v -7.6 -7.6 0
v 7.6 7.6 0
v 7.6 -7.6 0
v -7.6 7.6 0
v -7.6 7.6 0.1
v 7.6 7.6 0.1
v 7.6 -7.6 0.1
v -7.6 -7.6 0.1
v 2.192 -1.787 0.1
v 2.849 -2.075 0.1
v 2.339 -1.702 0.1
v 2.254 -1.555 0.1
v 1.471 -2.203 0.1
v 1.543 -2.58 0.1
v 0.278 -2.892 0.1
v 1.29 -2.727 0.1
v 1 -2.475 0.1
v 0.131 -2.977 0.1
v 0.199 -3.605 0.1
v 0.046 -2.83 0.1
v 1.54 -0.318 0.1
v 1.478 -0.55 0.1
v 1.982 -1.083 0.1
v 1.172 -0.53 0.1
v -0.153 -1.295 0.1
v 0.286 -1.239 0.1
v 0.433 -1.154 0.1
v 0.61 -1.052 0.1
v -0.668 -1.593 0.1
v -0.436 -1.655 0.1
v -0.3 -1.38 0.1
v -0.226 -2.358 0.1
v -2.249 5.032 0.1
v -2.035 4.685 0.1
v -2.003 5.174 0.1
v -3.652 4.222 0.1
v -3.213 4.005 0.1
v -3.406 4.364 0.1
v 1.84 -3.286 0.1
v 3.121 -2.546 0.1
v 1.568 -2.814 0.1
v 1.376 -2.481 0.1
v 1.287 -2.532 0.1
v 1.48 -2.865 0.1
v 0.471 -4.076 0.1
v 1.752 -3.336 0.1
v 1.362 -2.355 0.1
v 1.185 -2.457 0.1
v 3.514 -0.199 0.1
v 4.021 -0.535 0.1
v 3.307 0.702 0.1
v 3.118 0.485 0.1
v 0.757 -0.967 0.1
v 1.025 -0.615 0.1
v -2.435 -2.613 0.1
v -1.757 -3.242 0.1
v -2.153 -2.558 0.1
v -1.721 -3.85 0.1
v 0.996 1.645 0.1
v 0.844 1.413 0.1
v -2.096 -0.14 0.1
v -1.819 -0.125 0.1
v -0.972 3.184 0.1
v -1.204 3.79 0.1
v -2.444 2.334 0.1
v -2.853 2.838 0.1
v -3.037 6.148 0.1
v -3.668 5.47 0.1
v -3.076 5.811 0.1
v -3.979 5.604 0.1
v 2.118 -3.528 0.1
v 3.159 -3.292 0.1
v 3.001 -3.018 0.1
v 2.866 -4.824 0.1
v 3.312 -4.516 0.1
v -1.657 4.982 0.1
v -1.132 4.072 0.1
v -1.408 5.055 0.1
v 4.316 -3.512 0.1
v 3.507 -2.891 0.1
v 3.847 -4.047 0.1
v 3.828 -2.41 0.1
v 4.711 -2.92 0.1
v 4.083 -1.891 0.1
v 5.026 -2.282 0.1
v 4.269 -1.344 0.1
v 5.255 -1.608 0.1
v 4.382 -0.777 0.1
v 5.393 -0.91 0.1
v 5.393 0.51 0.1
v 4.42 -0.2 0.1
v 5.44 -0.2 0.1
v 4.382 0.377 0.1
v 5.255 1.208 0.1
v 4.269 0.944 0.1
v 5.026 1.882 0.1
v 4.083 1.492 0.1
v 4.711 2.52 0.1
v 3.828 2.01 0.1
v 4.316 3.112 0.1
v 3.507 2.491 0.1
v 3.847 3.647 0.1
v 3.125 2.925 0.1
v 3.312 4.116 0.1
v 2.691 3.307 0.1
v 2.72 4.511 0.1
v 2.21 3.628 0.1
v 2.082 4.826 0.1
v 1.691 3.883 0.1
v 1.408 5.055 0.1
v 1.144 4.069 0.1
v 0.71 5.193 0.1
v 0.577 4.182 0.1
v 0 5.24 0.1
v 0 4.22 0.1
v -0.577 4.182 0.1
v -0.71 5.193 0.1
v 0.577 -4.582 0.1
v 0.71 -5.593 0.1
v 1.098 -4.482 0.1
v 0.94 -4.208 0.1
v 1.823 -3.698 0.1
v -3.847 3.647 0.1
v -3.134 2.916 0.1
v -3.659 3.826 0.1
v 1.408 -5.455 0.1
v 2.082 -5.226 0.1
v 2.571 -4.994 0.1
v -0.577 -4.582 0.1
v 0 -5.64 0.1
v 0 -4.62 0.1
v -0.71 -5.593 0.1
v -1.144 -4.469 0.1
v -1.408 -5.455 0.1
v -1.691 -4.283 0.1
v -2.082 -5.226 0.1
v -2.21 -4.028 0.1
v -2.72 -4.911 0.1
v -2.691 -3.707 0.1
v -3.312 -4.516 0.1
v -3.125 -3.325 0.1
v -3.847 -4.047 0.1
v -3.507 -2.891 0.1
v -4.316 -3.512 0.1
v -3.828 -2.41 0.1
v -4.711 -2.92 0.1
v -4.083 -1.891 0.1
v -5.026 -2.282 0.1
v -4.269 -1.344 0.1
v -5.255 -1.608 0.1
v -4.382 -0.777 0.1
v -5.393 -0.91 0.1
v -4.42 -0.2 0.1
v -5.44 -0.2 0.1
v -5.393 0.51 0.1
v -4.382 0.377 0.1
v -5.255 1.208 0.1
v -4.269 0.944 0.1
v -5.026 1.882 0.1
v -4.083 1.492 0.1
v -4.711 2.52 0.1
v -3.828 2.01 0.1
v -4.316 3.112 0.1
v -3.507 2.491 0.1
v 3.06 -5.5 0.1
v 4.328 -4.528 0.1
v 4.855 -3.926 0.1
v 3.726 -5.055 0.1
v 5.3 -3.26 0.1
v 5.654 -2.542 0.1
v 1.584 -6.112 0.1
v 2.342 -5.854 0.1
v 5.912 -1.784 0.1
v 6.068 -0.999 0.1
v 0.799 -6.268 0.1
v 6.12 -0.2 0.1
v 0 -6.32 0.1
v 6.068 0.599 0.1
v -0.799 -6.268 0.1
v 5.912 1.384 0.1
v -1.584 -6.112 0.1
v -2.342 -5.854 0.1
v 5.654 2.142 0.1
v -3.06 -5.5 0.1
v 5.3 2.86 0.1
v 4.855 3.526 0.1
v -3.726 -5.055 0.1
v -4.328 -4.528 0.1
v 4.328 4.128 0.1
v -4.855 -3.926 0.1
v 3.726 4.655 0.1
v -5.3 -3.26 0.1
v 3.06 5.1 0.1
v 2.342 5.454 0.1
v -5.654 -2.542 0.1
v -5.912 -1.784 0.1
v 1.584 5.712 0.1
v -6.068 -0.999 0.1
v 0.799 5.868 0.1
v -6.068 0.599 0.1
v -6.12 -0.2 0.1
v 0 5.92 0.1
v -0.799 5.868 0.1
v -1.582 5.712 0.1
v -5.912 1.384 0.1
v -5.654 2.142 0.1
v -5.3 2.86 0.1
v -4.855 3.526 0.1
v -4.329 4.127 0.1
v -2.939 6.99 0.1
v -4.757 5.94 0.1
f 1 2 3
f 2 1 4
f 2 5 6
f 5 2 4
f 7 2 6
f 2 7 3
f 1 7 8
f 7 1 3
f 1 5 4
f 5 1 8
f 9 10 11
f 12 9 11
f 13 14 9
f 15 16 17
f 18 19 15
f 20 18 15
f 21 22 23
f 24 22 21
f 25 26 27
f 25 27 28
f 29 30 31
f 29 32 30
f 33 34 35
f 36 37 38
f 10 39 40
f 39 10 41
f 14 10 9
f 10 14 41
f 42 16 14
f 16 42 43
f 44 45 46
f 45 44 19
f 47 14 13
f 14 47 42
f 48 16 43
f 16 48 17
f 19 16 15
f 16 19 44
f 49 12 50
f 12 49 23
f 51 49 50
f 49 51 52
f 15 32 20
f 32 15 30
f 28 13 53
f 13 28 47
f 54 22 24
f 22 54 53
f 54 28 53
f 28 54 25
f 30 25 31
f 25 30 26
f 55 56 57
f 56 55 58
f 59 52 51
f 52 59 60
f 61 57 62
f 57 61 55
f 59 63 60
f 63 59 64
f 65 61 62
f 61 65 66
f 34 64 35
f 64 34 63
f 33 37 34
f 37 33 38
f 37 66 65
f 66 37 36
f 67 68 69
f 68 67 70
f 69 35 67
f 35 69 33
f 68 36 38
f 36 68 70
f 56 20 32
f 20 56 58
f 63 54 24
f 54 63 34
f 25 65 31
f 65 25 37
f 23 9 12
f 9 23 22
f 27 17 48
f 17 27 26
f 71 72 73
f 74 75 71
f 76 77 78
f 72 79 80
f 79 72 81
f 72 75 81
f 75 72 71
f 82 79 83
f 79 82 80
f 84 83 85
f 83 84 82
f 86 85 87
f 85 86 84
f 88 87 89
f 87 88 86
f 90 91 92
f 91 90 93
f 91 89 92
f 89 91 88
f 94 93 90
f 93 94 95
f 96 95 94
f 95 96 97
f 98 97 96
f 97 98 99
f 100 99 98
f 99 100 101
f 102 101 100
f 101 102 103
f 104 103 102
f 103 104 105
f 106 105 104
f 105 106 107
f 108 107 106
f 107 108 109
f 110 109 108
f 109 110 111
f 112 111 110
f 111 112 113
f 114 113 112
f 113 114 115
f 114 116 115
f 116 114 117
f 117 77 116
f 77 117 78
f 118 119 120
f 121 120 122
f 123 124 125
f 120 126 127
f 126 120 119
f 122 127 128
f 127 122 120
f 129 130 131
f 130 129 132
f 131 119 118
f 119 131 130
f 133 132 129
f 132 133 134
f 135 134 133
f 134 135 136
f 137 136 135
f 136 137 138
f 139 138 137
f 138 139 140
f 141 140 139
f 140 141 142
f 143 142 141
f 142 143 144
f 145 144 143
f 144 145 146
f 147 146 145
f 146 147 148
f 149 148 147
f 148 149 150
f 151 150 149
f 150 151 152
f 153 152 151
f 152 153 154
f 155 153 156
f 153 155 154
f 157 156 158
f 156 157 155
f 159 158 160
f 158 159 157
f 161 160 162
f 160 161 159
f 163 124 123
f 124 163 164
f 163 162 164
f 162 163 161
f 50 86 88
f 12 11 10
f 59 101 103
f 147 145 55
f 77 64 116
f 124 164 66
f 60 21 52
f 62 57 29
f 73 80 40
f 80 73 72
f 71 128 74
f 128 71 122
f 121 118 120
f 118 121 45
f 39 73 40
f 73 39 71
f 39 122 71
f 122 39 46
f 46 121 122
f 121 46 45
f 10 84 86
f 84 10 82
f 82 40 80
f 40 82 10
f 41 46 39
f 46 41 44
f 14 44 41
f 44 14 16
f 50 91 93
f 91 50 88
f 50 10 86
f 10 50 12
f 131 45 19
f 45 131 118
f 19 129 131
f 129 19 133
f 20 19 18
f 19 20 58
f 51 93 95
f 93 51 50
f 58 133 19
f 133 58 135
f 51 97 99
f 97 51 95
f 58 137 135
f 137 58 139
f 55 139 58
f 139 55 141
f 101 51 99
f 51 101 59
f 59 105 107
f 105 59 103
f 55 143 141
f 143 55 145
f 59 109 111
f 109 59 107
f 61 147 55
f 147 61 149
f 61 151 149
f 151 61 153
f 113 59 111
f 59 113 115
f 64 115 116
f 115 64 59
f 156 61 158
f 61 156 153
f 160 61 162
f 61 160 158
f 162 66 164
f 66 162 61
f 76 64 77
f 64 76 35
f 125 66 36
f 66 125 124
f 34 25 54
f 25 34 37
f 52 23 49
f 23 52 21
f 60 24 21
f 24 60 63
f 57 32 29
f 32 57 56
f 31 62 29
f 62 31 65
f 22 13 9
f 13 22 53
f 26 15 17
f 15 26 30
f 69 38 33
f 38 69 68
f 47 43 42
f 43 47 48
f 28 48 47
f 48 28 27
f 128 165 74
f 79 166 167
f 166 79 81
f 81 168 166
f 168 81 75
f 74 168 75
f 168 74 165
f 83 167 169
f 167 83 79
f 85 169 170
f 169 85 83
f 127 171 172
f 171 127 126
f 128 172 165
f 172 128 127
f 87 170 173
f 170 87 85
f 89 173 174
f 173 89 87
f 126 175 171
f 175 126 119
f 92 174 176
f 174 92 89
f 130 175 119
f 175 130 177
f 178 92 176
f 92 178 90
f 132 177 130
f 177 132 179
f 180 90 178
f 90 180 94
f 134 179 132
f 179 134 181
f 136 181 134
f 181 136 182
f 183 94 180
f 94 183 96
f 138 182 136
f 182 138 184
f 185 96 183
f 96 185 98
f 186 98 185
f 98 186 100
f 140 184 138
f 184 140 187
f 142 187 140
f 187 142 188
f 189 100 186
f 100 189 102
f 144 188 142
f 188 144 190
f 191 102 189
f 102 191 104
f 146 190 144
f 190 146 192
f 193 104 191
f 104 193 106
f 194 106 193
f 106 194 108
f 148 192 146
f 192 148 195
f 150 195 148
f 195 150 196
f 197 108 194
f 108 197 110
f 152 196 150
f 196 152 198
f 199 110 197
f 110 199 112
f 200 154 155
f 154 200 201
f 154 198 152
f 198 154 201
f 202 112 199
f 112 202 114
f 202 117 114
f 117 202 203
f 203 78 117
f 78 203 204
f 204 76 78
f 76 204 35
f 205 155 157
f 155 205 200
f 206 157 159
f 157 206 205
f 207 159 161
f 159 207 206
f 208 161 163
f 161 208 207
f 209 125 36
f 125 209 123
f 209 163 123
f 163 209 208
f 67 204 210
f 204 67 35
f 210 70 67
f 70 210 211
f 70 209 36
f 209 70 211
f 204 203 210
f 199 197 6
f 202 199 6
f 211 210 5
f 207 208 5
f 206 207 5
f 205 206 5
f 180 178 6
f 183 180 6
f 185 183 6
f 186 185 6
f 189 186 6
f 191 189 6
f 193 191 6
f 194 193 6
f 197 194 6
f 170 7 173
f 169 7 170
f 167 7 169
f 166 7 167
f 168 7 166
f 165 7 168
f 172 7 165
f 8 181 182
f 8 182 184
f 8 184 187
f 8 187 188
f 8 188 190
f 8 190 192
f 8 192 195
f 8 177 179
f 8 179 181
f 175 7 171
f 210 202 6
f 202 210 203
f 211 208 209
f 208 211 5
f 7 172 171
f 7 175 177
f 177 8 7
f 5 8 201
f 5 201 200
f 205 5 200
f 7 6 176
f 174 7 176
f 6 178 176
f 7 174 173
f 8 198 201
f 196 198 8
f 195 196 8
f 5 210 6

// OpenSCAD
// file: ../p/logo-launchcommand-bg.scad
use <../lib.scad>
function ldraw_lib__logo_launchcommand_bg() = [
// 0 Launch Command Logo Background (without Border)
// 0 Name: logo-launchcommand-bg.dat
// 0 Author: Chris Böhnke [KnightOfTarenta]
// 0 !LDRAW_ORG Primitive UPDATE 2025-05
// 0 !LICENSE Licensed under CC BY 4.0 : see CAreadme.txt
// 
// 0 !HELP Dimensions X = 32; Z = 34.67
// 
// 0 BFC CERTIFY CCW
  [0,"BFC","CERTIFY"],
  [0,"BFC","CCW"],
// 
// 0 !HISTORY 2025-04-27 [OrionP] Official Update 2025-04
// 0 !HISTORY 2025-05-24 [Holly-Wood] Updated description
// 0 !HISTORY 2025-05-28 [OrionP] Official Update 2025-05
// 
// 0 // Colour 16 Main Colour
// 3 16 -12.889 0 -1.697 -12.557 0 -3.365 -11.826 0 -.984
  [3,16,-12.889,0,-1.697,-12.557,0,-3.365,-11.826,0,-.984],
// 3 16 -8.38 0 -5.514 -6.88 0 -4.417 -6.63 0 -3.984
  [3,16,-8.38,0,-5.514,-6.88,0,-4.417,-6.63,0,-3.984],
// 3 16 -9.192 0 9.192 -10.314 0 7.914 -2.929 0 5.426
  [3,16,-9.192,0,9.192,-10.314,0,7.914,-2.929,0,5.426],
// 3 16 7.161 0 -7.097 11.258 0 -6.5 12.01 0 -4.975
  [3,16,7.161,0,-7.097,11.258,0,-6.5,12.01,0,-4.975],
// 3 16 1.697 0 12.889 3.542 0 11.736 3.329 0 12.566
  [3,16,1.697,0,12.889,3.542,0,11.736,3.329,0,12.566],
// 3 16 8.392 0 8.936 10.314 0 7.914 9.218 0 9.166
  [3,16,8.392,0,8.936,10.314,0,7.914,9.218,0,9.166],
// 3 16 -9.171 0 2.016 -4.53 0 -.347 -2.483 0 4.744
  [3,16,-9.171,0,2.016,-4.53,0,-.347,-2.483,0,4.744],
// 3 16 1.965 0 -4.097 6.331 0 -6.934 5.35 0 .222
  [3,16,1.965,0,-4.097,6.331,0,-6.934,5.35,0,.222],
// 4 16 -9.18 0 -6.9 -10.314 0 -7.914 -9.291 0 -9.093 -8.827 0 -8.289
  [4,16,-9.18,0,-6.9,-10.314,0,-7.914,-9.291,0,-9.093,-8.827,0,-8.289],
// 4 16 -7.563 0 -14.1 -5.363 0 -10.289 -6.229 0 -9.789 -8.429 0 -13.6
  [4,16,-7.563,0,-14.1,-5.363,0,-10.289,-6.229,0,-9.789,-8.429,0,-13.6],
// 4 16 -1.386 0 -11.4 -2.765 0 -11.789 -3.229 0 -12.593 -1.697 0 -12.889
  [4,16,-1.386,0,-11.4,-2.765,0,-11.789,-3.229,0,-12.593,-1.697,0,-12.889],
// 4 16 -9.18 0 -6.9 -8.827 0 -8.289 -6.229 0 -9.789 -5.413 0 -9.075
  [4,16,-9.18,0,-6.9,-8.827,0,-8.289,-6.229,0,-9.789,-5.413,0,-9.075],
// 4 16 -5.413 0 -9.075 -6.229 0 -9.789 -5.363 0 -10.289 -5.153 0 -9.225
  [4,16,-5.413,0,-9.075,-6.229,0,-9.789,-5.363,0,-10.289,-5.153,0,-9.225],
// 4 16 -1.386 0 -11.4 -5.153 0 -9.225 -5.363 0 -10.289 -2.765 0 -11.789
  [4,16,-1.386,0,-11.4,-5.153,0,-9.225,-5.363,0,-10.289,-2.765,0,-11.789],
// 4 16 -12.557 0 -3.365 -12.01 0 -4.975 -11.258 0 -6.5 -8.38 0 -5.514
  [4,16,-12.557,0,-3.365,-12.01,0,-4.975,-11.258,0,-6.5,-8.38,0,-5.514],
// 4 16 -10.314 0 -7.914 -9.18 0 -6.9 -8.38 0 -5.514 -11.258 0 -6.5
  [4,16,-10.314,0,-7.914,-9.18,0,-6.9,-8.38,0,-5.514,-11.258,0,-6.5],
// 4 16 -4.613 0 -7.689 -5.413 0 -9.075 -5.153 0 -9.225 -4.353 0 -7.839
  [4,16,-4.613,0,-7.689,-5.413,0,-9.075,-5.153,0,-9.225,-4.353,0,-7.839],
// 4 16 -3.794 0 -7.431 -4.538 0 -7.001 -4.613 0 -7.689 -4.353 0 -7.839
  [4,16,-3.794,0,-7.431,-4.538,0,-7.001,-4.613,0,-7.689,-4.353,0,-7.839],
// 4 16 -12.889 0 -1.697 -11.826 0 -.984 -12.889 0 1.697 -13 0 0
  [4,16,-12.889,0,-1.697,-11.826,0,-.984,-12.889,0,1.697,-13,0,0],
// 4 16 -12.557 0 -3.365 -8.38 0 -5.514 -6.63 0 -3.984 -11.826 0 -.984
  [4,16,-12.557,0,-3.365,-8.38,0,-5.514,-6.63,0,-3.984,-11.826,0,-.984],
// 4 16 -1.697 0 -12.889 0 0 -13 -.586 0 -10.014 -1.386 0 -11.4
  [4,16,-1.697,0,-12.889,0,0,-13,-.586,0,-10.014,-1.386,0,-11.4],
// 4 16 0 0 -13 1.697 0 -12.889 3.365 0 -12.557 -.586 0 -10.014
  [4,16,0,0,-13,1.697,0,-12.889,3.365,0,-12.557,-.586,0,-10.014],
// 4 16 5.061 0 -10.734 -.135 0 -7.734 -.385 0 -8.167 -.586 0 -10.014
  [4,16,5.061,0,-10.734,-.135,0,-7.734,-.385,0,-8.167,-.586,0,-10.014],
// 4 16 -11.826 0 -.984 -9.726 0 2.653 -12.557 0 3.365 -12.889 0 1.697
  [4,16,-11.826,0,-.984,-9.726,0,2.653,-12.557,0,3.365,-12.889,0,1.697],
// 4 16 -.586 0 -10.014 3.365 0 -12.557 4.975 0 -12.01 5.061 0 -10.734
  [4,16,-.586,0,-10.014,3.365,0,-12.557,4.975,0,-12.01,5.061,0,-10.734],
// 4 16 -12.557 0 3.365 -9.726 0 2.653 -11.258 0 6.5 -12.01 0 4.975
  [4,16,-12.557,0,3.365,-9.726,0,2.653,-11.258,0,6.5,-12.01,0,4.975],
// 4 16 4.975 0 -12.01 6.5 0 -11.258 7.914 0 -10.314 5.061 0 -10.734
  [4,16,4.975,0,-12.01,6.5,0,-11.258,7.914,0,-10.314,5.061,0,-10.734],
// 4 16 5.061 0 -10.734 7.914 0 -10.314 9.192 0 -9.192 7.161 0 -7.097
  [4,16,5.061,0,-10.734,7.914,0,-10.314,9.192,0,-9.192,7.161,0,-7.097],
// 4 16 -11.258 0 6.5 -9.726 0 2.653 -2.929 0 5.426 -10.314 0 7.914
  [4,16,-11.258,0,6.5,-9.726,0,2.653,-2.929,0,5.426,-10.314,0,7.914],
// 4 16 -6.5 0 11.258 -7.914 0 10.314 -9.192 0 9.192 -2.929 0 5.426
  [4,16,-6.5,0,11.258,-7.914,0,10.314,-9.192,0,9.192,-2.929,0,5.426],
// 4 16 9.192 0 -9.192 10.314 0 -7.914 11.258 0 -6.5 7.161 0 -7.097
  [4,16,9.192,0,-9.192,10.314,0,-7.914,11.258,0,-6.5,7.161,0,-7.097],
// 4 16 -3.365 0 12.557 -4.975 0 12.01 -6.5 0 11.258 -2.929 0 5.426
  [4,16,-3.365,0,12.557,-4.975,0,12.01,-6.5,0,11.258,-2.929,0,5.426],
// 4 16 7.161 0 -7.097 12.01 0 -4.975 12.557 0 -3.365 6.164 0 .176
  [4,16,7.161,0,-7.097,12.01,0,-4.975,12.557,0,-3.365,6.164,0,.176],
// 4 16 12.557 0 -3.365 12.889 0 -1.697 13 0 0 6.164 0 .176
  [4,16,12.557,0,-3.365,12.889,0,-1.697,13,0,0,6.164,0,.176],
// 4 16 -3.365 0 12.557 -2.929 0 5.426 0 0 13 -1.697 0 12.889
  [4,16,-3.365,0,12.557,-2.929,0,5.426,0,0,13,-1.697,0,12.889],
// 4 16 -2.929 0 5.426 3.542 0 11.736 1.697 0 12.889 0 0 13
  [4,16,-2.929,0,5.426,3.542,0,11.736,1.697,0,12.889,0,0,13],
// 4 16 13 0 0 12.889 0 1.697 12.557 0 3.365 6.164 0 .176
  [4,16,13,0,0,12.889,0,1.697,12.557,0,3.365,6.164,0,.176],
// 4 16 11.258 0 6.5 6.164 0 .176 12.557 0 3.365 12.01 0 4.975
  [4,16,11.258,0,6.5,6.164,0,.176,12.557,0,3.365,12.01,0,4.975],
// 4 16 10.314 0 7.914 8.392 0 8.936 6.164 0 .176 11.258 0 6.5
  [4,16,10.314,0,7.914,8.392,0,8.936,6.164,0,.176,11.258,0,6.5],
// 4 16 5.892 0 15.806 4.873 0 15.24 3.329 0 12.566 3.542 0 11.736
  [4,16,5.892,0,15.806,4.873,0,15.24,3.329,0,12.566,3.542,0,11.736],
// 4 16 10.742 0 13.006 8.392 0 8.936 9.218 0 9.166 10.762 0 11.84
  [4,16,10.742,0,13.006,8.392,0,8.936,9.218,0,9.166,10.762,0,11.84],
// 4 16 .449 0 -3.222 9.449 0 12.367 5.985 0 14.367 -3.015 0 -1.222
  [4,16,.449,0,-3.222,9.449,0,12.367,5.985,0,14.367,-3.015,0,-1.222],
// 4 16 -10.334 0 .002 -5.83 0 -2.598 -4.53 0 -.347 -9.171 0 2.016
  [4,16,-10.334,0,.002,-5.83,0,-2.598,-4.53,0,-.347,-9.171,0,2.016],
// 4 16 2.859 0 9.952 -2.483 0 4.744 -4.53 0 -.347 -3.448 0 -.972
  [4,16,2.859,0,9.952,-2.483,0,4.744,-4.53,0,-.347,-3.448,0,-.972],
// 4 16 1.965 0 -4.097 .665 0 -6.348 5.168 0 -8.948 6.331 0 -6.934
  [4,16,1.965,0,-4.097,.665,0,-6.348,5.168,0,-8.948,6.331,0,-6.934],
// 4 16 7.189 0 7.452 .882 0 -3.472 1.965 0 -4.097 5.35 0 .222
  [4,16,7.189,0,7.452,.882,0,-3.472,1.965,0,-4.097,5.35,0,.222],
// 4 16 -6.447 0 -4.667 -4.326 0 -5.892 -2.226 0 -2.255 -4.347 0 -1.03
  [4,16,-6.447,0,-4.667,-4.326,0,-5.892,-2.226,0,-2.255,-4.347,0,-1.03],
// 4 16 -.818 0 -7.917 1.282 0 -4.28 -.84 0 -3.055 -2.94 0 -6.692
  [4,16,-.818,0,-7.917,1.282,0,-4.28,-.84,0,-3.055,-2.94,0,-6.692],
// 4 16 10.019 0 13.424 10.787 0 16.675 9.047 0 17.68 6.616 0 15.388
  [4,16,10.019,0,13.424,10.787,0,16.675,9.047,0,17.68,6.616,0,15.388],
// 4 16 -4.046 0 -6.708 -3.786 0 -6.858 -3.486 0 -6.638 -4.006 0 -6.338
  [4,16,-4.046,0,-6.708,-3.786,0,-6.858,-3.486,0,-6.638,-4.006,0,-6.338],
// 4 16 -3.486 0 -6.638 -1.273 0 -2.805 -1.793 0 -2.505 -4.006 0 -6.338
  [4,16,-3.486,0,-6.638,-1.273,0,-2.805,-1.793,0,-2.505,-4.006,0,-6.338],
];
module ldraw_lib__logo_launchcommand_bg(step=0, col=false, unit=2/5, alt=false, line=0.2, solid=!$preview)
    makepoly(ldraw_lib__logo_launchcommand_bg(), step=step, col=col, unit=unit, alt=alt, line=line, solid=solid);
ldraw_lib__logo_launchcommand_bg(line=0.2);
// file: s/3068bp11s01.scad
use <../../lib.scad>
use <../../p/logo-launchcommand-bg.scad>
use <../../p/logo-launchcommand.scad>
function ldraw_lib__s__3068bp11s01() = [
// 0 ~Launch Command Logo Pattern (without Border)
// 0 Name: s\3068bp11s01.dat
// 0 Author: Chris Böhnke [KnightOfTarenta]
// 0 !LDRAW_ORG Subpart UPDATE 2026-02
// 0 !LICENSE Licensed under CC BY 4.0 : see CAreadme.txt
// 
// 0 !HELP Dimensions X = 32; Z = 34.67
// 
// 0 BFC CERTIFY CCW
  [0,"BFC","CERTIFY"],
  [0,"BFC","CCW"],
// 
// 0 !HISTORY 2025-03-30 [OrionP] Official Update 2025-03
// 0 !HISTORY 2025-04-04 [KnightOfTarenta] Sub-filed
// 0 !HISTORY 2026-03-06 [OrionP] Official Update 2026-02
// 
// 1 16 0 0 0 1 0 0 0 1 0 0 0 1 logo-launchcommand.dat
  [1,16,0,0,0,1,0,0,0,1,0,0,0,1, ldraw_lib__logo_launchcommand()],
// 1 16 0 0 0 1 0 0 0 1 0 0 0 1 logo-launchcommand-bg.dat
  [1,16,0,0,0,1,0,0,0,1,0,0,0,1, ldraw_lib__logo_launchcommand_bg()],
];
module ldraw_lib__s__3068bp11s01(step=0, col=false, unit=2/5, alt=false, line=0.2, solid=!$preview)
    makepoly(ldraw_lib__s__3068bp11s01(), step=step, col=col, unit=unit, alt=alt, line=line, solid=solid);
ldraw_lib__s__3068bp11s01(line=0.2);
// file: s/169665es01.scad
use <../../lib.scad>
function ldraw_lib__s__169665es01() = [
// 0 ~Outline for Launch Command Logo
// 0 Name: s\169665es01.dat
// 0 Author: Chris Böhnke [KnightOfTarenta]
// 0 !LDRAW_ORG Subpart UPDATE 2026-02
// 0 !LICENSE Licensed under CC BY 4.0 : see CAreadme.txt
// 
// 0 BFC CERTIFY CCW
  [0,"BFC","CERTIFY"],
  [0,"BFC","CCW"],
// 
// 0 !HISTORY 2026-03-06 [OrionP] Official Update 2026-02
// 
// 3 16 -8.429 0 -13.6 -9 0 -15.589 -7.563 0 -14.1
  [3,16,-8.429,0,-13.6,-9,0,-15.589,-7.563,0,-14.1],
// 4 16 -14.28 0 -10.958 -12.728 0 -12.728 -11.314 0 -11.314 -12.694 0 -9.74
  [4,16,-14.28,0,-10.958,-12.728,0,-12.728,-11.314,0,-11.314,-12.694,0,-9.74],
// 4 16 -12.728 0 -12.728 -10.958 0 -14.28 -9.74 0 -12.694 -11.314 0 -11.314
  [4,16,-12.728,0,-12.728,-10.958,0,-14.28,-9.74,0,-12.694,-11.314,0,-11.314],
// 4 16 -9 0 -15.589 -8.429 0 -13.6 -9.74 0 -12.694 -10.958 0 -14.28
  [4,16,-9,0,-15.589,-8.429,0,-13.6,-9.74,0,-12.694,-10.958,0,-14.28],
// 4 16 -12.694 0 -9.74 -13.856 0 -8 -15.588 0 -9 -14.28 0 -10.958
  [4,16,-12.694,0,-9.74,-13.856,0,-8,-15.588,0,-9,-14.28,0,-10.958],
// 4 16 -13.856 0 -8 -14.782 0 -6.123 -16.63 0 -6.888 -15.588 0 -9
  [4,16,-13.856,0,-8,-14.782,0,-6.123,-16.63,0,-6.888,-15.588,0,-9],
// 4 16 -4.141 0 -15.455 -6.123 0 -14.782 -6.888 0 -16.63 -4.659 0 -17.387
  [4,16,-4.141,0,-15.455,-6.123,0,-14.782,-6.888,0,-16.63,-4.659,0,-17.387],
// 4 16 -9 0 -15.589 -6.888 0 -16.63 -6.123 0 -14.782 -7.563 0 -14.1
  [4,16,-9,0,-15.589,-6.888,0,-16.63,-6.123,0,-14.782,-7.563,0,-14.1],
// 4 16 -14.782 0 -6.123 -15.455 0 -4.141 -17.387 0 -4.659 -16.63 0 -6.888
  [4,16,-14.782,0,-6.123,-15.455,0,-4.141,-17.387,0,-4.659,-16.63,0,-6.888],
// 4 16 -15.455 0 -4.141 -15.863 0 -2.088 -17.846 0 -2.35 -17.387 0 -4.659
  [4,16,-15.455,0,-4.141,-15.863,0,-2.088,-17.846,0,-2.35,-17.387,0,-4.659],
// 4 16 -4.659 0 -17.387 -2.349 0 -17.846 -2.088 0 -15.863 -4.141 0 -15.455
  [4,16,-4.659,0,-17.387,-2.349,0,-17.846,-2.088,0,-15.863,-4.141,0,-15.455],
// 4 16 -15.863 0 -2.088 -16 0 0 -18 0 0 -17.846 0 -2.35
  [4,16,-15.863,0,-2.088,-16,0,0,-18,0,0,-17.846,0,-2.35],
// 4 16 -2.349 0 -17.846 0 0 -18 0 0 -16 -2.088 0 -15.863
  [4,16,-2.349,0,-17.846,0,0,-18,0,0,-16,-2.088,0,-15.863],
// 4 16 -16 0 0 -15.863 0 2.088 -17.846 0 2.349 -18 0 0
  [4,16,-16,0,0,-15.863,0,2.088,-17.846,0,2.349,-18,0,0],
// 4 16 0 0 -18 2.349 0 -17.846 2.088 0 -15.863 0 0 -16
  [4,16,0,0,-18,2.349,0,-17.846,2.088,0,-15.863,0,0,-16],
// 4 16 -15.863 0 2.088 -15.455 0 4.141 -17.387 0 4.659 -17.846 0 2.349
  [4,16,-15.863,0,2.088,-15.455,0,4.141,-17.387,0,4.659,-17.846,0,2.349],
// 4 16 2.349 0 -17.846 4.659 0 -17.387 4.141 0 -15.455 2.088 0 -15.863
  [4,16,2.349,0,-17.846,4.659,0,-17.387,4.141,0,-15.455,2.088,0,-15.863],
// 4 16 6.123 0 -14.782 4.141 0 -15.455 4.659 0 -17.387 6.888 0 -16.63
  [4,16,6.123,0,-14.782,4.141,0,-15.455,4.659,0,-17.387,6.888,0,-16.63],
// 4 16 -15.455 0 4.141 -14.782 0 6.123 -16.63 0 6.888 -17.387 0 4.659
  [4,16,-15.455,0,4.141,-14.782,0,6.123,-16.63,0,6.888,-17.387,0,4.659],
// 4 16 8 0 -13.856 6.123 0 -14.782 6.888 0 -16.63 9 0 -15.589
  [4,16,8,0,-13.856,6.123,0,-14.782,6.888,0,-16.63,9,0,-15.589],
// 4 16 -14.782 0 6.123 -13.856 0 8 -15.588 0 9 -16.63 0 6.888
  [4,16,-14.782,0,6.123,-13.856,0,8,-15.588,0,9,-16.63,0,6.888],
// 4 16 -13.856 0 8 -12.694 0 9.74 -14.28 0 10.958 -15.588 0 9
  [4,16,-13.856,0,8,-12.694,0,9.74,-14.28,0,10.958,-15.588,0,9],
// 4 16 8 0 -13.856 9 0 -15.589 10.958 0 -14.28 9.74 0 -12.694
  [4,16,8,0,-13.856,9,0,-15.589,10.958,0,-14.28,9.74,0,-12.694],
// 4 16 10.958 0 -14.28 12.728 0 -12.728 11.314 0 -11.314 9.74 0 -12.694
  [4,16,10.958,0,-14.28,12.728,0,-12.728,11.314,0,-11.314,9.74,0,-12.694],
// 4 16 -12.694 0 9.74 -11.314 0 11.314 -12.728 0 12.728 -14.28 0 10.958
  [4,16,-12.694,0,9.74,-11.314,0,11.314,-12.728,0,12.728,-14.28,0,10.958],
// 4 16 14.28 0 -10.958 12.694 0 -9.74 11.314 0 -11.314 12.728 0 -12.728
  [4,16,14.28,0,-10.958,12.694,0,-9.74,11.314,0,-11.314,12.728,0,-12.728],
// 4 16 -11.314 0 11.314 -9.74 0 12.694 -10.958 0 14.28 -12.728 0 12.728
  [4,16,-11.314,0,11.314,-9.74,0,12.694,-10.958,0,14.28,-12.728,0,12.728],
// 4 16 12.694 0 -9.74 14.28 0 -10.958 15.588 0 -9 13.856 0 -8
  [4,16,12.694,0,-9.74,14.28,0,-10.958,15.588,0,-9,13.856,0,-8],
// 4 16 -9.74 0 12.694 -8 0 13.856 -9 0 15.588 -10.958 0 14.28
  [4,16,-9.74,0,12.694,-8,0,13.856,-9,0,15.588,-10.958,0,14.28],
// 4 16 -6.888 0 16.63 -9 0 15.588 -8 0 13.856 -6.123 0 14.782
  [4,16,-6.888,0,16.63,-9,0,15.588,-8,0,13.856,-6.123,0,14.782],
// 4 16 15.588 0 -9 16.63 0 -6.888 14.782 0 -6.123 13.856 0 -8
  [4,16,15.588,0,-9,16.63,0,-6.888,14.782,0,-6.123,13.856,0,-8],
// 4 16 17.387 0 -4.659 15.455 0 -4.141 14.782 0 -6.123 16.63 0 -6.888
  [4,16,17.387,0,-4.659,15.455,0,-4.141,14.782,0,-6.123,16.63,0,-6.888],
// 4 16 -4.141 0 15.455 -4.659 0 17.387 -6.888 0 16.63 -6.123 0 14.782
  [4,16,-4.141,0,15.455,-4.659,0,17.387,-6.888,0,16.63,-6.123,0,14.782],
// 4 16 17.387 0 -4.659 17.846 0 -2.35 15.863 0 -2.088 15.455 0 -4.141
  [4,16,17.387,0,-4.659,17.846,0,-2.35,15.863,0,-2.088,15.455,0,-4.141],
// 4 16 -2.088 0 15.863 -2.349 0 17.846 -4.659 0 17.387 -4.141 0 15.455
  [4,16,-2.088,0,15.863,-2.349,0,17.846,-4.659,0,17.387,-4.141,0,15.455],
// 4 16 17.846 0 2.349 15.863 0 2.088 16 0 0 18 0 0
  [4,16,17.846,0,2.349,15.863,0,2.088,16,0,0,18,0,0],
// 4 16 17.846 0 -2.35 18 0 0 16 0 0 15.863 0 -2.088
  [4,16,17.846,0,-2.35,18,0,0,16,0,0,15.863,0,-2.088],
// 4 16 -2.088 0 15.863 0 0 16 0 0 18 -2.349 0 17.846
  [4,16,-2.088,0,15.863,0,0,16,0,0,18,-2.349,0,17.846],
// 4 16 2.088 0 15.863 2.349 0 17.846 0 0 18 0 0 16
  [4,16,2.088,0,15.863,2.349,0,17.846,0,0,18,0,0,16],
// 4 16 2.349 0 17.846 2.088 0 15.863 4.141 0 15.455 4.654 0 17.387
  [4,16,2.349,0,17.846,2.088,0,15.863,4.141,0,15.455,4.654,0,17.387],
// 4 16 5.892 0 15.806 4.654 0 17.387 4.141 0 15.455 4.873 0 15.24
  [4,16,5.892,0,15.806,4.654,0,17.387,4.141,0,15.455,4.873,0,15.24],
// 4 16 15.455 0 4.141 15.863 0 2.088 17.846 0 2.349 17.387 0 4.659
  [4,16,15.455,0,4.141,15.863,0,2.088,17.846,0,2.349,17.387,0,4.659],
// 4 16 15.455 0 4.141 17.387 0 4.659 16.63 0 6.888 14.782 0 6.123
  [4,16,15.455,0,4.141,17.387,0,4.659,16.63,0,6.888,14.782,0,6.123],
// 4 16 16.63 0 6.888 15.588 0 9 13.856 0 8 14.782 0 6.123
  [4,16,16.63,0,6.888,15.588,0,9,13.856,0,8,14.782,0,6.123],
// 4 16 15.588 0 9 14.28 0 10.958 12.694 0 9.74 13.856 0 8
  [4,16,15.588,0,9,14.28,0,10.958,12.694,0,9.74,13.856,0,8],
// 4 16 10.742 0 13.006 10.762 0 11.84 11.314 0 11.314 12.731 0 12.725
  [4,16,10.742,0,13.006,10.762,0,11.84,11.314,0,11.314,12.731,0,12.725],
// 4 16 14.28 0 10.958 12.731 0 12.725 11.314 0 11.314 12.694 0 9.74
  [4,16,14.28,0,10.958,12.731,0,12.725,11.314,0,11.314,12.694,0,9.74],
// 4 16 5.892 0 15.806 8.932 0 18.67 8.643 0 21.146 4.654 0 17.387
  [4,16,5.892,0,15.806,8.932,0,18.67,8.643,0,21.146,4.654,0,17.387],
// 4 16 8.643 0 21.146 8.932 0 18.67 11.703 0 17.07 13.992 0 18.058
  [4,16,8.643,0,21.146,8.932,0,18.67,11.703,0,17.07,13.992,0,18.058],
// 4 16 10.742 0 13.006 12.731 0 12.725 13.992 0 18.058 11.703 0 17.07
  [4,16,10.742,0,13.006,12.731,0,12.725,13.992,0,18.058,11.703,0,17.07],
];
module ldraw_lib__s__169665es01(step=0, col=false, unit=2/5, alt=false, line=0.2, solid=!$preview)
    makepoly(ldraw_lib__s__169665es01(), step=step, col=col, unit=unit, alt=alt, line=line, solid=solid);
ldraw_lib__s__169665es01(line=0.2);
// file: ../p/box5-12.scad
use <../lib.scad>
function ldraw_lib__box5_12() = [
// 0 Box with 5 Faces without Any Edges
// 0 Name: box5-12.dat
// 0 Author: Chris Dee [cwdee]
// 0 !LDRAW_ORG Primitive UPDATE 2009-02
// 0 !LICENSE Licensed under CC BY 4.0 : see CAreadme.txt
// 
// 0 BFC CERTIFY CCW
  [0,"BFC","CERTIFY"],
  [0,"BFC","CCW"],
// 
// 0 !HISTORY 2009-09-03 [PTadmin] Official Update 2009-02
// 
// 
// 4 16 1 1 1 1 1 -1 -1 1 -1 -1 1 1
  [4,16,1,1,1,1,1,-1,-1,1,-1,-1,1,1],
// 4 16 -1 0 1 1 0 1 1 1 1 -1 1 1
  [4,16,-1,0,1,1,0,1,1,1,1,-1,1,1],
// 4 16 -1 0 -1 -1 0 1 -1 1 1 -1 1 -1
  [4,16,-1,0,-1,-1,0,1,-1,1,1,-1,1,-1],
// 4 16 1 0 -1 -1 0 -1 -1 1 -1 1 1 -1
  [4,16,1,0,-1,-1,0,-1,-1,1,-1,1,1,-1],
// 4 16 1 0 1 1 0 -1 1 1 -1 1 1 1
  [4,16,1,0,1,1,0,-1,1,1,-1,1,1,1],
// 0
];
module ldraw_lib__box5_12(step=0, col=false, unit=2/5, alt=false, line=0.2, solid=!$preview)
    makepoly(ldraw_lib__box5_12(), step=step, col=col, unit=unit, alt=alt, line=line, solid=solid);
ldraw_lib__box5_12(line=0.2);
// file: 169655e.scad
use <../lib.scad>
use <../p/box5-12.scad>
use <s/169665es01.scad>
use <s/3068bp11s01.scad>
function ldraw_lib__169655e() = [
// 0 Sticker  1.9 x  1.9 with Launch Command Logo with White Border Facing Right
// 0 Name: 169655e.dat
// 0 Author: Chris Böhnke [KnightOfTarenta]
// 0 !LDRAW_ORG Part UPDATE 2026-02
// 0 !LICENSE Licensed under CC BY 4.0 : see CAreadme.txt
// 
// 0 BFC CERTIFY CCW
  [0,"BFC","CERTIFY"],
  [0,"BFC","CCW"],
// 
// 0 !KEYWORDS Bricklink 6544stk01, Brickowl 420128, Launch Command
// 0 !KEYWORDS Rebrickable 169655, Set 6544, Shuttle Transcon 2, space port, stamp
// 0 !KEYWORDS town
// 
// 0 !HISTORY 2026-03-06 [OrionP] Official Update 2026-02
// 
// 1 16 0 -0.25 0 19 0 0 0 0.25 0 0 0 19 box5-12.dat
  [1,16,0,-0.25,0,19,0,0,0,0.25,0,0,0,19, ldraw_lib__box5_12()],
// 
// 0 BFC NOCLIP
  [0,"BFC","NOCLIP"],
// 1 15 0 -.25 -.5 .85 0 0 0 1 0 0 0 .85 s\3068bp11s01.dat
  [1,15,0,-.25,-.5,.85,0,0,0,1,0,0,0,.85, ldraw_lib__s__3068bp11s01()],
// 1 15 0 -.25 -.5 .85 0 0 0 1 0 0 0 .85 s\169665es01.dat
  [1,15,0,-.25,-.5,.85,0,0,0,1,0,0,0,.85, ldraw_lib__s__169665es01()],
// 
// 0 BFC CLIP
  [0,"BFC","CLIP"],
// 0 // Colour 16 Main Colour
// 3 16 7.34655 -.25 17.4741 1.99665 -.25 14.6691 3.9559 -.25 14.27895
  [3,16,7.34655,-.25,17.4741,1.99665,-.25,14.6691,3.9559,-.25,14.27895],
// 3 16 -19 -.25 19 -3.96015 -.25 14.27895 -1.99665 -.25 14.6691
  [3,16,-19,-.25,19,-3.96015,-.25,14.27895,-1.99665,-.25,14.6691],
// 3 16 -19 -.25 19 -1.99665 -.25 14.6691 0 -.25 14.8
  [3,16,-19,-.25,19,-1.99665,-.25,14.6691,0,-.25,14.8],
// 3 16 19 -.25 19 7.34655 -.25 17.4741 11.8932 -.25 14.8493
  [3,16,19,-.25,19,7.34655,-.25,17.4741,11.8932,-.25,14.8493],
// 3 16 19 -.25 19 12.138 -.25 8.8143 13.2498 -.25 7.15
  [3,16,19,-.25,19,12.138,-.25,8.8143,13.2498,-.25,7.15],
// 3 16 19 -.25 19 13.2498 -.25 7.15 14.1355 -.25 5.3548
  [3,16,19,-.25,19,13.2498,-.25,7.15,14.1355,-.25,5.3548],
// 3 16 19 -.25 19 14.1355 -.25 5.3548 14.77895 -.25 3.46015
  [3,16,19,-.25,19,14.1355,-.25,5.3548,14.77895,-.25,3.46015],
// 3 16 -19 -.25 19 -15.1691 -.25 1.49665 -14.77895 -.25 3.46015
  [3,16,-19,-.25,19,-15.1691,-.25,1.49665,-14.77895,-.25,3.46015],
// 3 16 -19 -.25 19 -14.77895 -.25 3.46015 -14.1355 -.25 5.3548
  [3,16,-19,-.25,19,-14.77895,-.25,3.46015,-14.1355,-.25,5.3548],
// 3 16 -19 -.25 19 -14.1355 -.25 5.3548 -13.2498 -.25 7.15
  [3,16,-19,-.25,19,-14.1355,-.25,5.3548,-13.2498,-.25,7.15],
// 3 16 -19 -.25 19 -13.2498 -.25 7.15 -12.138 -.25 8.8143
  [3,16,-19,-.25,19,-13.2498,-.25,7.15,-12.138,-.25,8.8143],
// 3 16 -19 -.25 19 -12.138 -.25 8.8143 -10.8188 -.25 10.3188
  [3,16,-19,-.25,19,-12.138,-.25,8.8143,-10.8188,-.25,10.3188],
// 3 16 -19 -.25 19 -10.8188 -.25 10.3188 -9.3143 -.25 11.638
  [3,16,-19,-.25,19,-10.8188,-.25,10.3188,-9.3143,-.25,11.638],
// 3 16 -19 -.25 19 -9.3143 -.25 11.638 -7.65 -.25 12.7498
  [3,16,-19,-.25,19,-9.3143,-.25,11.638,-7.65,-.25,12.7498],
// 3 16 -19 -.25 19 -7.65 -.25 12.7498 -5.8548 -.25 13.6355
  [3,16,-19,-.25,19,-7.65,-.25,12.7498,-5.8548,-.25,13.6355],
// 3 16 -19 -.25 19 -5.8548 -.25 13.6355 -3.96015 -.25 14.27895
  [3,16,-19,-.25,19,-5.8548,-.25,13.6355,-3.96015,-.25,14.27895],
// 3 16 -14.77895 -.25 -4.46015 -19 -.25 -19 -14.1355 -.25 -6.3548
  [3,16,-14.77895,-.25,-4.46015,-19,-.25,-19,-14.1355,-.25,-6.3548],
// 3 16 -14.1355 -.25 -6.3548 -19 -.25 -19 -13.2498 -.25 -8.15
  [3,16,-14.1355,-.25,-6.3548,-19,-.25,-19,-13.2498,-.25,-8.15],
// 3 16 -13.2498 -.25 -8.15 -19 -.25 -19 -12.138 -.25 -9.8143
  [3,16,-13.2498,-.25,-8.15,-19,-.25,-19,-12.138,-.25,-9.8143],
// 3 16 -12.138 -.25 -9.8143 -19 -.25 -19 -10.8188 -.25 -11.3188
  [3,16,-12.138,-.25,-9.8143,-19,-.25,-19,-10.8188,-.25,-11.3188],
// 3 16 -10.8188 -.25 -11.3188 -19 -.25 -19 -9.3143 -.25 -12.638
  [3,16,-10.8188,-.25,-11.3188,-19,-.25,-19,-9.3143,-.25,-12.638],
// 3 16 -9.3143 -.25 -12.638 -19 -.25 -19 -7.65 -.25 -13.75065
  [3,16,-9.3143,-.25,-12.638,-19,-.25,-19,-7.65,-.25,-13.75065],
// 3 16 -7.65 -.25 -13.75065 -19 -.25 -19 -5.8548 -.25 -14.6355
  [3,16,-7.65,-.25,-13.75065,-19,-.25,-19,-5.8548,-.25,-14.6355],
// 3 16 5.8548 -.25 -14.6355 3.96015 -.25 -15.27895 19 -.25 -19
  [3,16,5.8548,-.25,-14.6355,3.96015,-.25,-15.27895,19,-.25,-19],
// 3 16 7.65 -.25 -13.75065 5.8548 -.25 -14.6355 19 -.25 -19
  [3,16,7.65,-.25,-13.75065,5.8548,-.25,-14.6355,19,-.25,-19],
// 3 16 9.3143 -.25 -12.638 7.65 -.25 -13.75065 19 -.25 -19
  [3,16,9.3143,-.25,-12.638,7.65,-.25,-13.75065,19,-.25,-19],
// 3 16 10.8188 -.25 -11.3188 9.3143 -.25 -12.638 19 -.25 -19
  [3,16,10.8188,-.25,-11.3188,9.3143,-.25,-12.638,19,-.25,-19],
// 3 16 12.138 -.25 -9.8143 10.8188 -.25 -11.3188 19 -.25 -19
  [3,16,12.138,-.25,-9.8143,10.8188,-.25,-11.3188,19,-.25,-19],
// 3 16 13.2498 -.25 -8.15 12.138 -.25 -9.8143 19 -.25 -19
  [3,16,13.2498,-.25,-8.15,12.138,-.25,-9.8143,19,-.25,-19],
// 3 16 14.1355 -.25 -6.3548 13.2498 -.25 -8.15 19 -.25 -19
  [3,16,14.1355,-.25,-6.3548,13.2498,-.25,-8.15,19,-.25,-19],
// 3 16 1.99665 -.25 -15.6691 0 -.25 -15.8 19 -.25 -19
  [3,16,1.99665,-.25,-15.6691,0,-.25,-15.8,19,-.25,-19],
// 3 16 3.96015 -.25 -15.27895 1.99665 -.25 -15.6691 19 -.25 -19
  [3,16,3.96015,-.25,-15.27895,1.99665,-.25,-15.6691,19,-.25,-19],
// 3 16 -3.96015 -.25 -15.27895 -19 -.25 -19 -1.99665 -.25 -15.6691
  [3,16,-3.96015,-.25,-15.27895,-19,-.25,-19,-1.99665,-.25,-15.6691],
// 4 16 0 -.25 14.8 1.99665 -.25 14.6691 7.34655 -.25 17.4741 -19 -.25 19
  [4,16,0,-.25,14.8,1.99665,-.25,14.6691,7.34655,-.25,17.4741,-19,-.25,19],
// 4 16 11.8932 -.25 14.8493 10.82135 -.25 10.31625 12.138 -.25 8.8143 19 -.25 19
  [4,16,11.8932,-.25,14.8493,10.82135,-.25,10.31625,12.138,-.25,8.8143,19,-.25,19],
// 3 16 -3.96015 -.25 -15.27895 -5.8548 -.25 -14.6355 -19 -.25 -19
  [3,16,-3.96015,-.25,-15.27895,-5.8548,-.25,-14.6355,-19,-.25,-19],
// 3 16 0 -.25 -15.8 -1.99665 -.25 -15.6691 -19 -.25 -19
  [3,16,0,-.25,-15.8,-1.99665,-.25,-15.6691,-19,-.25,-19],
// 3 16 -19 -.25 -19 19 -.25 -19 0 -.25 -15.8
  [3,16,-19,-.25,-19,19,-.25,-19,0,-.25,-15.8],
// 3 16 15.3 -.25 -.5 19 -.25 -19 19 -.25 19
  [3,16,15.3,-.25,-.5,19,-.25,-19,19,-.25,19],
// 3 16 15.1691 -.25 1.49665 15.3 -.25 -.5 19 -.25 19
  [3,16,15.1691,-.25,1.49665,15.3,-.25,-.5,19,-.25,19],
// 3 16 15.1691 -.25 1.49665 19 -.25 19 14.77895 -.25 3.46015
  [3,16,15.1691,-.25,1.49665,19,-.25,19,14.77895,-.25,3.46015],
// 3 16 -15.3 -.25 -.5 -19 -.25 19 -19 -.25 -19
  [3,16,-15.3,-.25,-.5,-19,-.25,19,-19,-.25,-19],
// 3 16 -15.3 -.25 -.5 -19 -.25 -19 -15.1691 -.25 -2.4975
  [3,16,-15.3,-.25,-.5,-19,-.25,-19,-15.1691,-.25,-2.4975],
// 3 16 -15.3 -.25 -.5 -15.1691 -.25 1.49665 -19 -.25 19
  [3,16,-15.3,-.25,-.5,-15.1691,-.25,1.49665,-19,-.25,19],
// 3 16 -14.77895 -.25 -4.46015 -15.1691 -.25 -2.4975 -19 -.25 -19
  [3,16,-14.77895,-.25,-4.46015,-15.1691,-.25,-2.4975,-19,-.25,-19],
// 3 16 15.3 -.25 -.5 15.1691 -.25 -2.4975 19 -.25 -19
  [3,16,15.3,-.25,-.5,15.1691,-.25,-2.4975,19,-.25,-19],
// 3 16 19 -.25 -19 15.1691 -.25 -2.4975 14.77895 -.25 -4.46015
  [3,16,19,-.25,-19,15.1691,-.25,-2.4975,14.77895,-.25,-4.46015],
// 3 16 19 -.25 -19 14.77895 -.25 -4.46015 14.1355 -.25 -6.3548
  [3,16,19,-.25,-19,14.77895,-.25,-4.46015,14.1355,-.25,-6.3548],
// 3 16 -19 -.25 19 7.34655 -.25 17.4741 19 -.25 19
  [3,16,-19,-.25,19,7.34655,-.25,17.4741,19,-.25,19],
];
module ldraw_lib__169655e(step=0, col=false, unit=2/5, alt=false, line=0.2, solid=!$preview)
    makepoly(ldraw_lib__169655e(), step=step, col=col, unit=unit, alt=alt, line=line, solid=solid);
ldraw_lib__169655e(line=0.2);
// main file
use <../lib.scad>
use <169655e.scad>
function ldraw_lib__169655f() = [
// 0 Sticker  1.9 x  1.9 with Launch Command Logo with White Border Facing Left
// 0 Name: 169655f.dat
// 0 Author: Chris Böhnke [KnightOfTarenta]
// 0 !LDRAW_ORG Part UPDATE 2026-02
// 0 !LICENSE Licensed under CC BY 4.0 : see CAreadme.txt
// 
// 0 BFC CERTIFY CCW
  [0,"BFC","CERTIFY"],
  [0,"BFC","CCW"],
// 
// 0 !KEYWORDS Bricklink 6544stk01, Brickowl 420128, Launch Command
// 0 !KEYWORDS Rebrickable 169655, Set 6544, Shuttle Transcon 2, space port, stamp
// 0 !KEYWORDS town
// 
// 0 !HISTORY 2026-03-06 [OrionP] Official Update 2026-02
// 
// 1 16 0 0 0 -1 0 0 0 1 0 0 0 1 169655e.dat
  [1,16,0,0,0,-1,0,0,0,1,0,0,0,1, ldraw_lib__169655e()],
];
module ldraw_lib__169655f(step=0, col=false, unit=2/5, alt=false, line=0.2, solid=!$preview)
    makepoly(ldraw_lib__169655f(), step=step, col=col, unit=unit, alt=alt, line=line, solid=solid);
ldraw_lib__169655f(line=0.2);
